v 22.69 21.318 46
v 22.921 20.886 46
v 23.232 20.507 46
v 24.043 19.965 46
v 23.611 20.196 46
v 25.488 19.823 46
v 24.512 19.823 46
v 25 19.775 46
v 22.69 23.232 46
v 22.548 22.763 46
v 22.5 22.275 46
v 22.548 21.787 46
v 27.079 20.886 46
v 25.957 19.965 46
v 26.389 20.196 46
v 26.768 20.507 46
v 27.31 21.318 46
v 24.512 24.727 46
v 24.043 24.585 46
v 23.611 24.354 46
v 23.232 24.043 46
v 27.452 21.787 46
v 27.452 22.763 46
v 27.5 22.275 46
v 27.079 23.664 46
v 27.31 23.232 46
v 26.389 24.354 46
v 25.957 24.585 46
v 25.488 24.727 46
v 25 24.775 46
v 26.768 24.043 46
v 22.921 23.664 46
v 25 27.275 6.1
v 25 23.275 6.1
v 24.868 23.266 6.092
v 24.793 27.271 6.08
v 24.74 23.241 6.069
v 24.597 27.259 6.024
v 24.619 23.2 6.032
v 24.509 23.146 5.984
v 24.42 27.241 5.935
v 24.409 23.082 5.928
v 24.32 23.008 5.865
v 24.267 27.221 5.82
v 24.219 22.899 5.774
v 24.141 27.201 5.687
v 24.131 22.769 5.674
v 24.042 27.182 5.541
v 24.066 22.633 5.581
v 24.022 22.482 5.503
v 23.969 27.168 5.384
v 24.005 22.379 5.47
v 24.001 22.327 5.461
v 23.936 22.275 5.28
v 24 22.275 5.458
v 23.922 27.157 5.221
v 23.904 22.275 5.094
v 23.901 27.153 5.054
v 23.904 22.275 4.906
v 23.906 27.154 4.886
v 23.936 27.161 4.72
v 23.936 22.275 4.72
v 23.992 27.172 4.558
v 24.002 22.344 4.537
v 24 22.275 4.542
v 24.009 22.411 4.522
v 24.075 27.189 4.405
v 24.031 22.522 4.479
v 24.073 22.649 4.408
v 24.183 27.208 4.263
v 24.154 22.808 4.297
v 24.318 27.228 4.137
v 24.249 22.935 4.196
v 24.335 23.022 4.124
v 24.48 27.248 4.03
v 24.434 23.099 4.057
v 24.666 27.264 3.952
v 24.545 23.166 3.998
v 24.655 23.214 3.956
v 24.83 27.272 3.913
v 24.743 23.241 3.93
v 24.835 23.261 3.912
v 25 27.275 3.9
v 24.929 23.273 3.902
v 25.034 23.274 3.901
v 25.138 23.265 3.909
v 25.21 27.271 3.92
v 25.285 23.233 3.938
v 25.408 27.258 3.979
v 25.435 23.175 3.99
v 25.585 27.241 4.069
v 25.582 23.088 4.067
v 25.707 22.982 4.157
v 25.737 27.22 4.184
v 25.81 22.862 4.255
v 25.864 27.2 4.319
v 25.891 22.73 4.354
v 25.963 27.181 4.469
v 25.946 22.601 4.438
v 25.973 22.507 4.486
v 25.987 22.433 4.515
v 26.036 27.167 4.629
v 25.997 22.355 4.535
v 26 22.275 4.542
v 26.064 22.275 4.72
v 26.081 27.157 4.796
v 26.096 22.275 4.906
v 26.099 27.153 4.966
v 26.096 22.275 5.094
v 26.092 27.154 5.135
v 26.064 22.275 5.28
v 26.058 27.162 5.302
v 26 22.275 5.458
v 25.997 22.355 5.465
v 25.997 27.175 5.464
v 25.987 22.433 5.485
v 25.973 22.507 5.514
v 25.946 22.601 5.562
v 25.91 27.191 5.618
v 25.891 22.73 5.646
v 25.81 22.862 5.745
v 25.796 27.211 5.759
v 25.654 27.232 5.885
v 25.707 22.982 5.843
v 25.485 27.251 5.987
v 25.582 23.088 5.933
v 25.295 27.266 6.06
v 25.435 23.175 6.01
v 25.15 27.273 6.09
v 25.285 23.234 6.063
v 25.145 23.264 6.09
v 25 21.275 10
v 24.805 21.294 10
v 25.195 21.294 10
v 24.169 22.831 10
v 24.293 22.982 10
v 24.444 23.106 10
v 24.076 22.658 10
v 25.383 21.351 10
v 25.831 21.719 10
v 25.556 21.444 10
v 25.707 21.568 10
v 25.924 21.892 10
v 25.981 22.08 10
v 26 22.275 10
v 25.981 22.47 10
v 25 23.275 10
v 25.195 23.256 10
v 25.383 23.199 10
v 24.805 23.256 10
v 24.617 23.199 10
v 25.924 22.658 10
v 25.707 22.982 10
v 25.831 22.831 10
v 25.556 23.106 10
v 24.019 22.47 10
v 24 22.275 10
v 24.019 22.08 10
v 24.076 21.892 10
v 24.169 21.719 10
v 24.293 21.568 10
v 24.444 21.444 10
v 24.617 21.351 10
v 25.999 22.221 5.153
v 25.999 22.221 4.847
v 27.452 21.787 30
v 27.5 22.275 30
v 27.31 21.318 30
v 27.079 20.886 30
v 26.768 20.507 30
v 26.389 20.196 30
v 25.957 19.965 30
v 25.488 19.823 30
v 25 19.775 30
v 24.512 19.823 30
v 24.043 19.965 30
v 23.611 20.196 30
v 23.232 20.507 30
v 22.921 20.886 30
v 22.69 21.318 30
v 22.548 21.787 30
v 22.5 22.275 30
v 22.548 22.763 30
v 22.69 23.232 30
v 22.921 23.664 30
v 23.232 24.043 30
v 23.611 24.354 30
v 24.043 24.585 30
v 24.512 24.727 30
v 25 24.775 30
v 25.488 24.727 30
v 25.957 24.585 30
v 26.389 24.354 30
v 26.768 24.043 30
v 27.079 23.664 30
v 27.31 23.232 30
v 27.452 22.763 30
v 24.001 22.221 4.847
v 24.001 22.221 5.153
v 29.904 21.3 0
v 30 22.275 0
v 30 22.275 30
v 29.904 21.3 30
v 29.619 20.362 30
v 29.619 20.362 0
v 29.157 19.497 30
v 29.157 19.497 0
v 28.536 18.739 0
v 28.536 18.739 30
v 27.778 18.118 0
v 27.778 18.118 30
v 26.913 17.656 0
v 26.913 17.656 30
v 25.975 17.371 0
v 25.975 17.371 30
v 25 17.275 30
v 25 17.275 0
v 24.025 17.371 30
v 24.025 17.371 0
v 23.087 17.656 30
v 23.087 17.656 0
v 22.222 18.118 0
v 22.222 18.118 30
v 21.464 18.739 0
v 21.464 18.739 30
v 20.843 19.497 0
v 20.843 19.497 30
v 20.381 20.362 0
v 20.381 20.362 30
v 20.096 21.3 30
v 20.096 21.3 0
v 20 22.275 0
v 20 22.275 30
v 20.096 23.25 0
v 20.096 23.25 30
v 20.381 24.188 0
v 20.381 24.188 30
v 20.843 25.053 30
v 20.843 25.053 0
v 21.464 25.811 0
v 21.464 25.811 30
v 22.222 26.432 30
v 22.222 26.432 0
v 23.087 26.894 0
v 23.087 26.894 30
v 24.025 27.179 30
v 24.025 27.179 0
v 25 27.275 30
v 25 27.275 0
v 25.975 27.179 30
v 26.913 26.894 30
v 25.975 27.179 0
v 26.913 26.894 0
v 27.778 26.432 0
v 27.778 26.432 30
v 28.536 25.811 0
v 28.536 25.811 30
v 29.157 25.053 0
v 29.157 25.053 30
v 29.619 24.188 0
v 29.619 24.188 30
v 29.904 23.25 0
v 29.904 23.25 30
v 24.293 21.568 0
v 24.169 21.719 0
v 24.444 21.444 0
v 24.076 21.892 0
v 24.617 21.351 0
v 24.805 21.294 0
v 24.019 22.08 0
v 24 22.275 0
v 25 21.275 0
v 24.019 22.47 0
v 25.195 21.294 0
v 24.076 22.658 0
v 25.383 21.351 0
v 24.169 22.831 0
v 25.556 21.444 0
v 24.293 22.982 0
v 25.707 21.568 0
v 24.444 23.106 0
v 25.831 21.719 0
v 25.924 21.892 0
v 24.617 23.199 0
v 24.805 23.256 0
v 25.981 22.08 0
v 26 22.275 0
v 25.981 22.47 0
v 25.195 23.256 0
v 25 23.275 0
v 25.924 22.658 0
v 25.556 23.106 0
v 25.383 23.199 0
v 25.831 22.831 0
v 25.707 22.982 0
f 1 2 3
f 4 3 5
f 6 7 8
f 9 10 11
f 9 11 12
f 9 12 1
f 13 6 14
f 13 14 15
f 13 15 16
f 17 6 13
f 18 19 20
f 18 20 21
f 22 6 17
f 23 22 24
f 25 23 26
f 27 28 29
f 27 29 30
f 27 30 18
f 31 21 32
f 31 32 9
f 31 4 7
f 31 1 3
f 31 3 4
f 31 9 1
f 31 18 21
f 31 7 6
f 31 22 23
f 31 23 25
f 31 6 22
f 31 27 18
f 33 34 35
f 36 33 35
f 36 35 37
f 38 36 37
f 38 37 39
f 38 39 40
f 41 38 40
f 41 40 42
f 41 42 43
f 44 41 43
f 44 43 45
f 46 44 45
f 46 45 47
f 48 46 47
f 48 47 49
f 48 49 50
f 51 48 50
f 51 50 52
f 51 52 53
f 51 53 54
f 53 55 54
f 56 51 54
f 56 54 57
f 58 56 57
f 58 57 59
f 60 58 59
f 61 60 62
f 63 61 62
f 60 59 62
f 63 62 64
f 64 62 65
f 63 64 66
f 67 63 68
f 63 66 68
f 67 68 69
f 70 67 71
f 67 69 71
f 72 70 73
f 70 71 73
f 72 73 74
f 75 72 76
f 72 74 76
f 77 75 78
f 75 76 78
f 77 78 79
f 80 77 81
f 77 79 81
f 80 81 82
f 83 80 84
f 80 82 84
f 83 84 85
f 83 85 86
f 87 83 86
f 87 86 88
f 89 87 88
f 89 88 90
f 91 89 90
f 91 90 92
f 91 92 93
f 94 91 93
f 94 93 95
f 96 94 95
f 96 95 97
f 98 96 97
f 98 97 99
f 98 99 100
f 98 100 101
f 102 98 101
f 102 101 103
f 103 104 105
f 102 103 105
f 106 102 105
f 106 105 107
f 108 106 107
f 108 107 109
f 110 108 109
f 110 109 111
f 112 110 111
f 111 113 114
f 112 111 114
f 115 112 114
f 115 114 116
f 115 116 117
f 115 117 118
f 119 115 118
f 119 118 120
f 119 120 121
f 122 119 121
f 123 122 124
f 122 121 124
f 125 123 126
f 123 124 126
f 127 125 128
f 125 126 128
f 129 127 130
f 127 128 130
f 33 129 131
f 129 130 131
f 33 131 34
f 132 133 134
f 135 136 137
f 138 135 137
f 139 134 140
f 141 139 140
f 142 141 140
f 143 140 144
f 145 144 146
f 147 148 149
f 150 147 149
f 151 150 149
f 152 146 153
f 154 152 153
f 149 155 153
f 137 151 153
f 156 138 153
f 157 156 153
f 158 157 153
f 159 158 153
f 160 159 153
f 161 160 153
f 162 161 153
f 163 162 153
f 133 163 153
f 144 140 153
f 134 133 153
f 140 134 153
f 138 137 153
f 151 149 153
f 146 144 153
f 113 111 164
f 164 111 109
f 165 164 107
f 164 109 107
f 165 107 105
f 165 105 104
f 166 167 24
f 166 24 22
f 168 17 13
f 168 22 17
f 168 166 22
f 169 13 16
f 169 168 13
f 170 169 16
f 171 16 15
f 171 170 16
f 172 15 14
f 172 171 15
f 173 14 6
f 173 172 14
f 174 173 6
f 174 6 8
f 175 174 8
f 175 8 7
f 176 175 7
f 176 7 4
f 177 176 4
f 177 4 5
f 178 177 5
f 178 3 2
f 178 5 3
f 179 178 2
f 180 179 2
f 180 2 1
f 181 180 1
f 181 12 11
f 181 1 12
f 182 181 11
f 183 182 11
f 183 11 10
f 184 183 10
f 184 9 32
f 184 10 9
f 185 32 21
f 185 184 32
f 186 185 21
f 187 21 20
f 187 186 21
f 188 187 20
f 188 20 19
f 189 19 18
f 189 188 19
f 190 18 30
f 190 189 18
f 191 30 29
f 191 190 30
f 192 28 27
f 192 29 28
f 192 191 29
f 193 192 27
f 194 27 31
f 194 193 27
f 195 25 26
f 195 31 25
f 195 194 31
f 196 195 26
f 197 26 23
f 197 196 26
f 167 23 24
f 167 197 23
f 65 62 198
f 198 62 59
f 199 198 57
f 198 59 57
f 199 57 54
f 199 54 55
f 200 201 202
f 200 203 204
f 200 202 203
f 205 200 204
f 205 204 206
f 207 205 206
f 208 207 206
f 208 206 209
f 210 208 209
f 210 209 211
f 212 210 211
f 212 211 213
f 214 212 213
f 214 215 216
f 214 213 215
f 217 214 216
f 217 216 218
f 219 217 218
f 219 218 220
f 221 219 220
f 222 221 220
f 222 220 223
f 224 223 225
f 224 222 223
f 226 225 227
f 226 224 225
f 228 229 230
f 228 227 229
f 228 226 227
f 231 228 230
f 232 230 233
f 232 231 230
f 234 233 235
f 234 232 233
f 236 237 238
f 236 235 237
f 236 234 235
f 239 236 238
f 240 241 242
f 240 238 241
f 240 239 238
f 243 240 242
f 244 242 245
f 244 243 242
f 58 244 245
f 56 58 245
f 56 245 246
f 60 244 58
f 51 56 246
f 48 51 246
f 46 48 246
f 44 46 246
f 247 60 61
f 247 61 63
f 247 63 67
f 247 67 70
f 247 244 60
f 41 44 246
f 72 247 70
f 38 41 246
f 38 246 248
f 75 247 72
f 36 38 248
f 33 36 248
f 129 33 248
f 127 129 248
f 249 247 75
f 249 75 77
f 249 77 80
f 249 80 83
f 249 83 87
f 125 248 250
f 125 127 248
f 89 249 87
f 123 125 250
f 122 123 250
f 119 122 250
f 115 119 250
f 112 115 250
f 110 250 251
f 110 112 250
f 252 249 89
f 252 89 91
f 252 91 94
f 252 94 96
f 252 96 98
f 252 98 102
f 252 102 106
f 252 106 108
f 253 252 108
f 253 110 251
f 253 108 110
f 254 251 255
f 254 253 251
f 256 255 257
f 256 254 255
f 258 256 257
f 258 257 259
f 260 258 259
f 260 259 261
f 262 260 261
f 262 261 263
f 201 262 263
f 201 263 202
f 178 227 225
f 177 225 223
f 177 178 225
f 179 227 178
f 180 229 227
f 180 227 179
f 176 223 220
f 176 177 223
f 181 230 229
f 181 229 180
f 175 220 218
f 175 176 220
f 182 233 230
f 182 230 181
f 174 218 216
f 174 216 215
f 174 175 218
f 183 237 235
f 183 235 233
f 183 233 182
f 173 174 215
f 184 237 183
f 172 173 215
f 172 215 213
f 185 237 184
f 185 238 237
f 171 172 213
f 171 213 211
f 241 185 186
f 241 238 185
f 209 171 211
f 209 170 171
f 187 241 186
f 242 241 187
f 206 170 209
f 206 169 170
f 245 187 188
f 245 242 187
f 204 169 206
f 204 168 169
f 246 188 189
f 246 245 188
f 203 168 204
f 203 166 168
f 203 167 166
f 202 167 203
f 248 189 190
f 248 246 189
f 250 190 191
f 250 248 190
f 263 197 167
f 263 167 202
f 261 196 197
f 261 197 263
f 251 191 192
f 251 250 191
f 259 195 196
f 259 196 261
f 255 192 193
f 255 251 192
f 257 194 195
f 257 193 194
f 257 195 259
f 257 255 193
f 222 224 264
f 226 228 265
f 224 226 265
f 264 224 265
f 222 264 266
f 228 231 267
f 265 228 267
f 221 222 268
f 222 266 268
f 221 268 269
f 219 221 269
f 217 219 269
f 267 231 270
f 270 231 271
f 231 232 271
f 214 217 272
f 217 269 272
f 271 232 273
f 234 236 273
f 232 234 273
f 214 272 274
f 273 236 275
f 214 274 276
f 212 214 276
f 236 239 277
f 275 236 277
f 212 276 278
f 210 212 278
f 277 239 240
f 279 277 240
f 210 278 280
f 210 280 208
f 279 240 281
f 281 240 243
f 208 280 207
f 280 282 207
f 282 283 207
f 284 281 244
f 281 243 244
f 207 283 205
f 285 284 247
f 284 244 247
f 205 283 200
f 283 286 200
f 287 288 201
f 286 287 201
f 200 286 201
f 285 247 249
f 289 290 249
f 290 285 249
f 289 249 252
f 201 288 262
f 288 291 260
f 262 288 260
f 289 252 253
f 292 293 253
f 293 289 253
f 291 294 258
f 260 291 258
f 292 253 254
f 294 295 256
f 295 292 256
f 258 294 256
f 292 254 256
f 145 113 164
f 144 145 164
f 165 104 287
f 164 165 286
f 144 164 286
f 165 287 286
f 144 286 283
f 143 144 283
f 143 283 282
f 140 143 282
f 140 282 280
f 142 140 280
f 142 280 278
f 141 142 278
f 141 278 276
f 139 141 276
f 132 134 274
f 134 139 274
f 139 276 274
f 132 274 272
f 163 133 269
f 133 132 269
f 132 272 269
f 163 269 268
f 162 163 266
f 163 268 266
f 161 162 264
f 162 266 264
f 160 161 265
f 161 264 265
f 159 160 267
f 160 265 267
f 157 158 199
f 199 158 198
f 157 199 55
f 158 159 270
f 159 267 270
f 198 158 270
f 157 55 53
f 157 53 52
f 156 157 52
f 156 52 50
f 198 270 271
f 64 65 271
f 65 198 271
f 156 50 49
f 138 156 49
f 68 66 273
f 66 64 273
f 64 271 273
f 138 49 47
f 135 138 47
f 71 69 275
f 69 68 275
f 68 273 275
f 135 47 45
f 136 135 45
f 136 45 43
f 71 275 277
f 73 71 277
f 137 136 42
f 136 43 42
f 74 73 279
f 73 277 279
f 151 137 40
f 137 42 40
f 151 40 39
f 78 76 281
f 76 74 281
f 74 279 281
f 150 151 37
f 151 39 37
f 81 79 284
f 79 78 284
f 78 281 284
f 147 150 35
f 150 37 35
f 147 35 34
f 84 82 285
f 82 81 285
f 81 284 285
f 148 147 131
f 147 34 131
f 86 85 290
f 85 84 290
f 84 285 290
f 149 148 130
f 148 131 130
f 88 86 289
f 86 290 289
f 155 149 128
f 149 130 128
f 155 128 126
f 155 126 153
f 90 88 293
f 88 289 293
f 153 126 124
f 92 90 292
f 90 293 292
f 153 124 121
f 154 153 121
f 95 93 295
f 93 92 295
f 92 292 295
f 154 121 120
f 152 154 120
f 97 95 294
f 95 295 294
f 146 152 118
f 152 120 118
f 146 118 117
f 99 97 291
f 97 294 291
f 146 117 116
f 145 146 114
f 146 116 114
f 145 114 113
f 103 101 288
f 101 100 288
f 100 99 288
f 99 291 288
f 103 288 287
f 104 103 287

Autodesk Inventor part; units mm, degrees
ref_plane "YZ Plane" through (0, 0, 0) normal (1, 0, 0) x (0, 1, 0)
ref_plane "XY Plane" through (0, 0, 0) normal (0, 0, 1) x (1, 0, 0)
sketch "Sketch1" plane through (0, 0, 0) normal (0, 0, 1) x (1, 0, 0)
  circle A0 centre (25, 22.275) radius 1 projected
  circle A1 centre (25, 22.275) radius 5
  circle A2 centre (25, 22.275) radius 1
  point P0 (0, 0)
  dimension "d0" = 10
  dimension "d6" = 2
extrude "Extrusion1" add sketch "Sketch1" along normal blind 30
sketch "Sketch2" plane through (25, 22.275, 30) normal (0, 0, 1) x (1, 0, 0)
  circle A0 centre (0, 0) radius 5 projected
  circle A1 centre (0, 0) radius 2.5
  circle A2 centre (0, 0) radius 1
  point P0 (-25, -22.275)
extrude "Extrusion2" add sketch "Sketch2" along normal blind 16 contours A1
ref_plane "Work Plane1" through (25, 27.275, 0) normal (0, 1, 0) x (-1, 0, 0)
sketch "Sketch4" plane through (25, 27.275, 0) normal (0, 1, 0) x (-1, 0, 0)
  circle A0 centre (0, 5) radius 1
  line L0 (5, 30) -> (-5, 30) projected
  line L1 (5, 0) -> (-5, 0) projected
  line L2 (5, 30) -> (-5, 30) projected
  line L3 (0, 30) -> (5, 30)
  line L4 (0, 30) -> (0, 25)
  point P0 (25, 0)
  dimension "d8" = 2
  dimension "d18" = 5
  dimension "d19" = 5
hole "Hole1" at (25, 27.275, 5) direction (0, -1, 0) diameter 2.2 depth 5 tip angle 118
sketch "Sketch5" plane through (25, 22.275, 46) normal (0, 0, 1) x (1, 0, 0)
  circle A0 centre (0, 0) radius 1
  point P0 (-25, -22.275)
extrude "Extrusion3" add sketch "Sketch5" against normal blind 36
properties part number "acoplador sensor"
